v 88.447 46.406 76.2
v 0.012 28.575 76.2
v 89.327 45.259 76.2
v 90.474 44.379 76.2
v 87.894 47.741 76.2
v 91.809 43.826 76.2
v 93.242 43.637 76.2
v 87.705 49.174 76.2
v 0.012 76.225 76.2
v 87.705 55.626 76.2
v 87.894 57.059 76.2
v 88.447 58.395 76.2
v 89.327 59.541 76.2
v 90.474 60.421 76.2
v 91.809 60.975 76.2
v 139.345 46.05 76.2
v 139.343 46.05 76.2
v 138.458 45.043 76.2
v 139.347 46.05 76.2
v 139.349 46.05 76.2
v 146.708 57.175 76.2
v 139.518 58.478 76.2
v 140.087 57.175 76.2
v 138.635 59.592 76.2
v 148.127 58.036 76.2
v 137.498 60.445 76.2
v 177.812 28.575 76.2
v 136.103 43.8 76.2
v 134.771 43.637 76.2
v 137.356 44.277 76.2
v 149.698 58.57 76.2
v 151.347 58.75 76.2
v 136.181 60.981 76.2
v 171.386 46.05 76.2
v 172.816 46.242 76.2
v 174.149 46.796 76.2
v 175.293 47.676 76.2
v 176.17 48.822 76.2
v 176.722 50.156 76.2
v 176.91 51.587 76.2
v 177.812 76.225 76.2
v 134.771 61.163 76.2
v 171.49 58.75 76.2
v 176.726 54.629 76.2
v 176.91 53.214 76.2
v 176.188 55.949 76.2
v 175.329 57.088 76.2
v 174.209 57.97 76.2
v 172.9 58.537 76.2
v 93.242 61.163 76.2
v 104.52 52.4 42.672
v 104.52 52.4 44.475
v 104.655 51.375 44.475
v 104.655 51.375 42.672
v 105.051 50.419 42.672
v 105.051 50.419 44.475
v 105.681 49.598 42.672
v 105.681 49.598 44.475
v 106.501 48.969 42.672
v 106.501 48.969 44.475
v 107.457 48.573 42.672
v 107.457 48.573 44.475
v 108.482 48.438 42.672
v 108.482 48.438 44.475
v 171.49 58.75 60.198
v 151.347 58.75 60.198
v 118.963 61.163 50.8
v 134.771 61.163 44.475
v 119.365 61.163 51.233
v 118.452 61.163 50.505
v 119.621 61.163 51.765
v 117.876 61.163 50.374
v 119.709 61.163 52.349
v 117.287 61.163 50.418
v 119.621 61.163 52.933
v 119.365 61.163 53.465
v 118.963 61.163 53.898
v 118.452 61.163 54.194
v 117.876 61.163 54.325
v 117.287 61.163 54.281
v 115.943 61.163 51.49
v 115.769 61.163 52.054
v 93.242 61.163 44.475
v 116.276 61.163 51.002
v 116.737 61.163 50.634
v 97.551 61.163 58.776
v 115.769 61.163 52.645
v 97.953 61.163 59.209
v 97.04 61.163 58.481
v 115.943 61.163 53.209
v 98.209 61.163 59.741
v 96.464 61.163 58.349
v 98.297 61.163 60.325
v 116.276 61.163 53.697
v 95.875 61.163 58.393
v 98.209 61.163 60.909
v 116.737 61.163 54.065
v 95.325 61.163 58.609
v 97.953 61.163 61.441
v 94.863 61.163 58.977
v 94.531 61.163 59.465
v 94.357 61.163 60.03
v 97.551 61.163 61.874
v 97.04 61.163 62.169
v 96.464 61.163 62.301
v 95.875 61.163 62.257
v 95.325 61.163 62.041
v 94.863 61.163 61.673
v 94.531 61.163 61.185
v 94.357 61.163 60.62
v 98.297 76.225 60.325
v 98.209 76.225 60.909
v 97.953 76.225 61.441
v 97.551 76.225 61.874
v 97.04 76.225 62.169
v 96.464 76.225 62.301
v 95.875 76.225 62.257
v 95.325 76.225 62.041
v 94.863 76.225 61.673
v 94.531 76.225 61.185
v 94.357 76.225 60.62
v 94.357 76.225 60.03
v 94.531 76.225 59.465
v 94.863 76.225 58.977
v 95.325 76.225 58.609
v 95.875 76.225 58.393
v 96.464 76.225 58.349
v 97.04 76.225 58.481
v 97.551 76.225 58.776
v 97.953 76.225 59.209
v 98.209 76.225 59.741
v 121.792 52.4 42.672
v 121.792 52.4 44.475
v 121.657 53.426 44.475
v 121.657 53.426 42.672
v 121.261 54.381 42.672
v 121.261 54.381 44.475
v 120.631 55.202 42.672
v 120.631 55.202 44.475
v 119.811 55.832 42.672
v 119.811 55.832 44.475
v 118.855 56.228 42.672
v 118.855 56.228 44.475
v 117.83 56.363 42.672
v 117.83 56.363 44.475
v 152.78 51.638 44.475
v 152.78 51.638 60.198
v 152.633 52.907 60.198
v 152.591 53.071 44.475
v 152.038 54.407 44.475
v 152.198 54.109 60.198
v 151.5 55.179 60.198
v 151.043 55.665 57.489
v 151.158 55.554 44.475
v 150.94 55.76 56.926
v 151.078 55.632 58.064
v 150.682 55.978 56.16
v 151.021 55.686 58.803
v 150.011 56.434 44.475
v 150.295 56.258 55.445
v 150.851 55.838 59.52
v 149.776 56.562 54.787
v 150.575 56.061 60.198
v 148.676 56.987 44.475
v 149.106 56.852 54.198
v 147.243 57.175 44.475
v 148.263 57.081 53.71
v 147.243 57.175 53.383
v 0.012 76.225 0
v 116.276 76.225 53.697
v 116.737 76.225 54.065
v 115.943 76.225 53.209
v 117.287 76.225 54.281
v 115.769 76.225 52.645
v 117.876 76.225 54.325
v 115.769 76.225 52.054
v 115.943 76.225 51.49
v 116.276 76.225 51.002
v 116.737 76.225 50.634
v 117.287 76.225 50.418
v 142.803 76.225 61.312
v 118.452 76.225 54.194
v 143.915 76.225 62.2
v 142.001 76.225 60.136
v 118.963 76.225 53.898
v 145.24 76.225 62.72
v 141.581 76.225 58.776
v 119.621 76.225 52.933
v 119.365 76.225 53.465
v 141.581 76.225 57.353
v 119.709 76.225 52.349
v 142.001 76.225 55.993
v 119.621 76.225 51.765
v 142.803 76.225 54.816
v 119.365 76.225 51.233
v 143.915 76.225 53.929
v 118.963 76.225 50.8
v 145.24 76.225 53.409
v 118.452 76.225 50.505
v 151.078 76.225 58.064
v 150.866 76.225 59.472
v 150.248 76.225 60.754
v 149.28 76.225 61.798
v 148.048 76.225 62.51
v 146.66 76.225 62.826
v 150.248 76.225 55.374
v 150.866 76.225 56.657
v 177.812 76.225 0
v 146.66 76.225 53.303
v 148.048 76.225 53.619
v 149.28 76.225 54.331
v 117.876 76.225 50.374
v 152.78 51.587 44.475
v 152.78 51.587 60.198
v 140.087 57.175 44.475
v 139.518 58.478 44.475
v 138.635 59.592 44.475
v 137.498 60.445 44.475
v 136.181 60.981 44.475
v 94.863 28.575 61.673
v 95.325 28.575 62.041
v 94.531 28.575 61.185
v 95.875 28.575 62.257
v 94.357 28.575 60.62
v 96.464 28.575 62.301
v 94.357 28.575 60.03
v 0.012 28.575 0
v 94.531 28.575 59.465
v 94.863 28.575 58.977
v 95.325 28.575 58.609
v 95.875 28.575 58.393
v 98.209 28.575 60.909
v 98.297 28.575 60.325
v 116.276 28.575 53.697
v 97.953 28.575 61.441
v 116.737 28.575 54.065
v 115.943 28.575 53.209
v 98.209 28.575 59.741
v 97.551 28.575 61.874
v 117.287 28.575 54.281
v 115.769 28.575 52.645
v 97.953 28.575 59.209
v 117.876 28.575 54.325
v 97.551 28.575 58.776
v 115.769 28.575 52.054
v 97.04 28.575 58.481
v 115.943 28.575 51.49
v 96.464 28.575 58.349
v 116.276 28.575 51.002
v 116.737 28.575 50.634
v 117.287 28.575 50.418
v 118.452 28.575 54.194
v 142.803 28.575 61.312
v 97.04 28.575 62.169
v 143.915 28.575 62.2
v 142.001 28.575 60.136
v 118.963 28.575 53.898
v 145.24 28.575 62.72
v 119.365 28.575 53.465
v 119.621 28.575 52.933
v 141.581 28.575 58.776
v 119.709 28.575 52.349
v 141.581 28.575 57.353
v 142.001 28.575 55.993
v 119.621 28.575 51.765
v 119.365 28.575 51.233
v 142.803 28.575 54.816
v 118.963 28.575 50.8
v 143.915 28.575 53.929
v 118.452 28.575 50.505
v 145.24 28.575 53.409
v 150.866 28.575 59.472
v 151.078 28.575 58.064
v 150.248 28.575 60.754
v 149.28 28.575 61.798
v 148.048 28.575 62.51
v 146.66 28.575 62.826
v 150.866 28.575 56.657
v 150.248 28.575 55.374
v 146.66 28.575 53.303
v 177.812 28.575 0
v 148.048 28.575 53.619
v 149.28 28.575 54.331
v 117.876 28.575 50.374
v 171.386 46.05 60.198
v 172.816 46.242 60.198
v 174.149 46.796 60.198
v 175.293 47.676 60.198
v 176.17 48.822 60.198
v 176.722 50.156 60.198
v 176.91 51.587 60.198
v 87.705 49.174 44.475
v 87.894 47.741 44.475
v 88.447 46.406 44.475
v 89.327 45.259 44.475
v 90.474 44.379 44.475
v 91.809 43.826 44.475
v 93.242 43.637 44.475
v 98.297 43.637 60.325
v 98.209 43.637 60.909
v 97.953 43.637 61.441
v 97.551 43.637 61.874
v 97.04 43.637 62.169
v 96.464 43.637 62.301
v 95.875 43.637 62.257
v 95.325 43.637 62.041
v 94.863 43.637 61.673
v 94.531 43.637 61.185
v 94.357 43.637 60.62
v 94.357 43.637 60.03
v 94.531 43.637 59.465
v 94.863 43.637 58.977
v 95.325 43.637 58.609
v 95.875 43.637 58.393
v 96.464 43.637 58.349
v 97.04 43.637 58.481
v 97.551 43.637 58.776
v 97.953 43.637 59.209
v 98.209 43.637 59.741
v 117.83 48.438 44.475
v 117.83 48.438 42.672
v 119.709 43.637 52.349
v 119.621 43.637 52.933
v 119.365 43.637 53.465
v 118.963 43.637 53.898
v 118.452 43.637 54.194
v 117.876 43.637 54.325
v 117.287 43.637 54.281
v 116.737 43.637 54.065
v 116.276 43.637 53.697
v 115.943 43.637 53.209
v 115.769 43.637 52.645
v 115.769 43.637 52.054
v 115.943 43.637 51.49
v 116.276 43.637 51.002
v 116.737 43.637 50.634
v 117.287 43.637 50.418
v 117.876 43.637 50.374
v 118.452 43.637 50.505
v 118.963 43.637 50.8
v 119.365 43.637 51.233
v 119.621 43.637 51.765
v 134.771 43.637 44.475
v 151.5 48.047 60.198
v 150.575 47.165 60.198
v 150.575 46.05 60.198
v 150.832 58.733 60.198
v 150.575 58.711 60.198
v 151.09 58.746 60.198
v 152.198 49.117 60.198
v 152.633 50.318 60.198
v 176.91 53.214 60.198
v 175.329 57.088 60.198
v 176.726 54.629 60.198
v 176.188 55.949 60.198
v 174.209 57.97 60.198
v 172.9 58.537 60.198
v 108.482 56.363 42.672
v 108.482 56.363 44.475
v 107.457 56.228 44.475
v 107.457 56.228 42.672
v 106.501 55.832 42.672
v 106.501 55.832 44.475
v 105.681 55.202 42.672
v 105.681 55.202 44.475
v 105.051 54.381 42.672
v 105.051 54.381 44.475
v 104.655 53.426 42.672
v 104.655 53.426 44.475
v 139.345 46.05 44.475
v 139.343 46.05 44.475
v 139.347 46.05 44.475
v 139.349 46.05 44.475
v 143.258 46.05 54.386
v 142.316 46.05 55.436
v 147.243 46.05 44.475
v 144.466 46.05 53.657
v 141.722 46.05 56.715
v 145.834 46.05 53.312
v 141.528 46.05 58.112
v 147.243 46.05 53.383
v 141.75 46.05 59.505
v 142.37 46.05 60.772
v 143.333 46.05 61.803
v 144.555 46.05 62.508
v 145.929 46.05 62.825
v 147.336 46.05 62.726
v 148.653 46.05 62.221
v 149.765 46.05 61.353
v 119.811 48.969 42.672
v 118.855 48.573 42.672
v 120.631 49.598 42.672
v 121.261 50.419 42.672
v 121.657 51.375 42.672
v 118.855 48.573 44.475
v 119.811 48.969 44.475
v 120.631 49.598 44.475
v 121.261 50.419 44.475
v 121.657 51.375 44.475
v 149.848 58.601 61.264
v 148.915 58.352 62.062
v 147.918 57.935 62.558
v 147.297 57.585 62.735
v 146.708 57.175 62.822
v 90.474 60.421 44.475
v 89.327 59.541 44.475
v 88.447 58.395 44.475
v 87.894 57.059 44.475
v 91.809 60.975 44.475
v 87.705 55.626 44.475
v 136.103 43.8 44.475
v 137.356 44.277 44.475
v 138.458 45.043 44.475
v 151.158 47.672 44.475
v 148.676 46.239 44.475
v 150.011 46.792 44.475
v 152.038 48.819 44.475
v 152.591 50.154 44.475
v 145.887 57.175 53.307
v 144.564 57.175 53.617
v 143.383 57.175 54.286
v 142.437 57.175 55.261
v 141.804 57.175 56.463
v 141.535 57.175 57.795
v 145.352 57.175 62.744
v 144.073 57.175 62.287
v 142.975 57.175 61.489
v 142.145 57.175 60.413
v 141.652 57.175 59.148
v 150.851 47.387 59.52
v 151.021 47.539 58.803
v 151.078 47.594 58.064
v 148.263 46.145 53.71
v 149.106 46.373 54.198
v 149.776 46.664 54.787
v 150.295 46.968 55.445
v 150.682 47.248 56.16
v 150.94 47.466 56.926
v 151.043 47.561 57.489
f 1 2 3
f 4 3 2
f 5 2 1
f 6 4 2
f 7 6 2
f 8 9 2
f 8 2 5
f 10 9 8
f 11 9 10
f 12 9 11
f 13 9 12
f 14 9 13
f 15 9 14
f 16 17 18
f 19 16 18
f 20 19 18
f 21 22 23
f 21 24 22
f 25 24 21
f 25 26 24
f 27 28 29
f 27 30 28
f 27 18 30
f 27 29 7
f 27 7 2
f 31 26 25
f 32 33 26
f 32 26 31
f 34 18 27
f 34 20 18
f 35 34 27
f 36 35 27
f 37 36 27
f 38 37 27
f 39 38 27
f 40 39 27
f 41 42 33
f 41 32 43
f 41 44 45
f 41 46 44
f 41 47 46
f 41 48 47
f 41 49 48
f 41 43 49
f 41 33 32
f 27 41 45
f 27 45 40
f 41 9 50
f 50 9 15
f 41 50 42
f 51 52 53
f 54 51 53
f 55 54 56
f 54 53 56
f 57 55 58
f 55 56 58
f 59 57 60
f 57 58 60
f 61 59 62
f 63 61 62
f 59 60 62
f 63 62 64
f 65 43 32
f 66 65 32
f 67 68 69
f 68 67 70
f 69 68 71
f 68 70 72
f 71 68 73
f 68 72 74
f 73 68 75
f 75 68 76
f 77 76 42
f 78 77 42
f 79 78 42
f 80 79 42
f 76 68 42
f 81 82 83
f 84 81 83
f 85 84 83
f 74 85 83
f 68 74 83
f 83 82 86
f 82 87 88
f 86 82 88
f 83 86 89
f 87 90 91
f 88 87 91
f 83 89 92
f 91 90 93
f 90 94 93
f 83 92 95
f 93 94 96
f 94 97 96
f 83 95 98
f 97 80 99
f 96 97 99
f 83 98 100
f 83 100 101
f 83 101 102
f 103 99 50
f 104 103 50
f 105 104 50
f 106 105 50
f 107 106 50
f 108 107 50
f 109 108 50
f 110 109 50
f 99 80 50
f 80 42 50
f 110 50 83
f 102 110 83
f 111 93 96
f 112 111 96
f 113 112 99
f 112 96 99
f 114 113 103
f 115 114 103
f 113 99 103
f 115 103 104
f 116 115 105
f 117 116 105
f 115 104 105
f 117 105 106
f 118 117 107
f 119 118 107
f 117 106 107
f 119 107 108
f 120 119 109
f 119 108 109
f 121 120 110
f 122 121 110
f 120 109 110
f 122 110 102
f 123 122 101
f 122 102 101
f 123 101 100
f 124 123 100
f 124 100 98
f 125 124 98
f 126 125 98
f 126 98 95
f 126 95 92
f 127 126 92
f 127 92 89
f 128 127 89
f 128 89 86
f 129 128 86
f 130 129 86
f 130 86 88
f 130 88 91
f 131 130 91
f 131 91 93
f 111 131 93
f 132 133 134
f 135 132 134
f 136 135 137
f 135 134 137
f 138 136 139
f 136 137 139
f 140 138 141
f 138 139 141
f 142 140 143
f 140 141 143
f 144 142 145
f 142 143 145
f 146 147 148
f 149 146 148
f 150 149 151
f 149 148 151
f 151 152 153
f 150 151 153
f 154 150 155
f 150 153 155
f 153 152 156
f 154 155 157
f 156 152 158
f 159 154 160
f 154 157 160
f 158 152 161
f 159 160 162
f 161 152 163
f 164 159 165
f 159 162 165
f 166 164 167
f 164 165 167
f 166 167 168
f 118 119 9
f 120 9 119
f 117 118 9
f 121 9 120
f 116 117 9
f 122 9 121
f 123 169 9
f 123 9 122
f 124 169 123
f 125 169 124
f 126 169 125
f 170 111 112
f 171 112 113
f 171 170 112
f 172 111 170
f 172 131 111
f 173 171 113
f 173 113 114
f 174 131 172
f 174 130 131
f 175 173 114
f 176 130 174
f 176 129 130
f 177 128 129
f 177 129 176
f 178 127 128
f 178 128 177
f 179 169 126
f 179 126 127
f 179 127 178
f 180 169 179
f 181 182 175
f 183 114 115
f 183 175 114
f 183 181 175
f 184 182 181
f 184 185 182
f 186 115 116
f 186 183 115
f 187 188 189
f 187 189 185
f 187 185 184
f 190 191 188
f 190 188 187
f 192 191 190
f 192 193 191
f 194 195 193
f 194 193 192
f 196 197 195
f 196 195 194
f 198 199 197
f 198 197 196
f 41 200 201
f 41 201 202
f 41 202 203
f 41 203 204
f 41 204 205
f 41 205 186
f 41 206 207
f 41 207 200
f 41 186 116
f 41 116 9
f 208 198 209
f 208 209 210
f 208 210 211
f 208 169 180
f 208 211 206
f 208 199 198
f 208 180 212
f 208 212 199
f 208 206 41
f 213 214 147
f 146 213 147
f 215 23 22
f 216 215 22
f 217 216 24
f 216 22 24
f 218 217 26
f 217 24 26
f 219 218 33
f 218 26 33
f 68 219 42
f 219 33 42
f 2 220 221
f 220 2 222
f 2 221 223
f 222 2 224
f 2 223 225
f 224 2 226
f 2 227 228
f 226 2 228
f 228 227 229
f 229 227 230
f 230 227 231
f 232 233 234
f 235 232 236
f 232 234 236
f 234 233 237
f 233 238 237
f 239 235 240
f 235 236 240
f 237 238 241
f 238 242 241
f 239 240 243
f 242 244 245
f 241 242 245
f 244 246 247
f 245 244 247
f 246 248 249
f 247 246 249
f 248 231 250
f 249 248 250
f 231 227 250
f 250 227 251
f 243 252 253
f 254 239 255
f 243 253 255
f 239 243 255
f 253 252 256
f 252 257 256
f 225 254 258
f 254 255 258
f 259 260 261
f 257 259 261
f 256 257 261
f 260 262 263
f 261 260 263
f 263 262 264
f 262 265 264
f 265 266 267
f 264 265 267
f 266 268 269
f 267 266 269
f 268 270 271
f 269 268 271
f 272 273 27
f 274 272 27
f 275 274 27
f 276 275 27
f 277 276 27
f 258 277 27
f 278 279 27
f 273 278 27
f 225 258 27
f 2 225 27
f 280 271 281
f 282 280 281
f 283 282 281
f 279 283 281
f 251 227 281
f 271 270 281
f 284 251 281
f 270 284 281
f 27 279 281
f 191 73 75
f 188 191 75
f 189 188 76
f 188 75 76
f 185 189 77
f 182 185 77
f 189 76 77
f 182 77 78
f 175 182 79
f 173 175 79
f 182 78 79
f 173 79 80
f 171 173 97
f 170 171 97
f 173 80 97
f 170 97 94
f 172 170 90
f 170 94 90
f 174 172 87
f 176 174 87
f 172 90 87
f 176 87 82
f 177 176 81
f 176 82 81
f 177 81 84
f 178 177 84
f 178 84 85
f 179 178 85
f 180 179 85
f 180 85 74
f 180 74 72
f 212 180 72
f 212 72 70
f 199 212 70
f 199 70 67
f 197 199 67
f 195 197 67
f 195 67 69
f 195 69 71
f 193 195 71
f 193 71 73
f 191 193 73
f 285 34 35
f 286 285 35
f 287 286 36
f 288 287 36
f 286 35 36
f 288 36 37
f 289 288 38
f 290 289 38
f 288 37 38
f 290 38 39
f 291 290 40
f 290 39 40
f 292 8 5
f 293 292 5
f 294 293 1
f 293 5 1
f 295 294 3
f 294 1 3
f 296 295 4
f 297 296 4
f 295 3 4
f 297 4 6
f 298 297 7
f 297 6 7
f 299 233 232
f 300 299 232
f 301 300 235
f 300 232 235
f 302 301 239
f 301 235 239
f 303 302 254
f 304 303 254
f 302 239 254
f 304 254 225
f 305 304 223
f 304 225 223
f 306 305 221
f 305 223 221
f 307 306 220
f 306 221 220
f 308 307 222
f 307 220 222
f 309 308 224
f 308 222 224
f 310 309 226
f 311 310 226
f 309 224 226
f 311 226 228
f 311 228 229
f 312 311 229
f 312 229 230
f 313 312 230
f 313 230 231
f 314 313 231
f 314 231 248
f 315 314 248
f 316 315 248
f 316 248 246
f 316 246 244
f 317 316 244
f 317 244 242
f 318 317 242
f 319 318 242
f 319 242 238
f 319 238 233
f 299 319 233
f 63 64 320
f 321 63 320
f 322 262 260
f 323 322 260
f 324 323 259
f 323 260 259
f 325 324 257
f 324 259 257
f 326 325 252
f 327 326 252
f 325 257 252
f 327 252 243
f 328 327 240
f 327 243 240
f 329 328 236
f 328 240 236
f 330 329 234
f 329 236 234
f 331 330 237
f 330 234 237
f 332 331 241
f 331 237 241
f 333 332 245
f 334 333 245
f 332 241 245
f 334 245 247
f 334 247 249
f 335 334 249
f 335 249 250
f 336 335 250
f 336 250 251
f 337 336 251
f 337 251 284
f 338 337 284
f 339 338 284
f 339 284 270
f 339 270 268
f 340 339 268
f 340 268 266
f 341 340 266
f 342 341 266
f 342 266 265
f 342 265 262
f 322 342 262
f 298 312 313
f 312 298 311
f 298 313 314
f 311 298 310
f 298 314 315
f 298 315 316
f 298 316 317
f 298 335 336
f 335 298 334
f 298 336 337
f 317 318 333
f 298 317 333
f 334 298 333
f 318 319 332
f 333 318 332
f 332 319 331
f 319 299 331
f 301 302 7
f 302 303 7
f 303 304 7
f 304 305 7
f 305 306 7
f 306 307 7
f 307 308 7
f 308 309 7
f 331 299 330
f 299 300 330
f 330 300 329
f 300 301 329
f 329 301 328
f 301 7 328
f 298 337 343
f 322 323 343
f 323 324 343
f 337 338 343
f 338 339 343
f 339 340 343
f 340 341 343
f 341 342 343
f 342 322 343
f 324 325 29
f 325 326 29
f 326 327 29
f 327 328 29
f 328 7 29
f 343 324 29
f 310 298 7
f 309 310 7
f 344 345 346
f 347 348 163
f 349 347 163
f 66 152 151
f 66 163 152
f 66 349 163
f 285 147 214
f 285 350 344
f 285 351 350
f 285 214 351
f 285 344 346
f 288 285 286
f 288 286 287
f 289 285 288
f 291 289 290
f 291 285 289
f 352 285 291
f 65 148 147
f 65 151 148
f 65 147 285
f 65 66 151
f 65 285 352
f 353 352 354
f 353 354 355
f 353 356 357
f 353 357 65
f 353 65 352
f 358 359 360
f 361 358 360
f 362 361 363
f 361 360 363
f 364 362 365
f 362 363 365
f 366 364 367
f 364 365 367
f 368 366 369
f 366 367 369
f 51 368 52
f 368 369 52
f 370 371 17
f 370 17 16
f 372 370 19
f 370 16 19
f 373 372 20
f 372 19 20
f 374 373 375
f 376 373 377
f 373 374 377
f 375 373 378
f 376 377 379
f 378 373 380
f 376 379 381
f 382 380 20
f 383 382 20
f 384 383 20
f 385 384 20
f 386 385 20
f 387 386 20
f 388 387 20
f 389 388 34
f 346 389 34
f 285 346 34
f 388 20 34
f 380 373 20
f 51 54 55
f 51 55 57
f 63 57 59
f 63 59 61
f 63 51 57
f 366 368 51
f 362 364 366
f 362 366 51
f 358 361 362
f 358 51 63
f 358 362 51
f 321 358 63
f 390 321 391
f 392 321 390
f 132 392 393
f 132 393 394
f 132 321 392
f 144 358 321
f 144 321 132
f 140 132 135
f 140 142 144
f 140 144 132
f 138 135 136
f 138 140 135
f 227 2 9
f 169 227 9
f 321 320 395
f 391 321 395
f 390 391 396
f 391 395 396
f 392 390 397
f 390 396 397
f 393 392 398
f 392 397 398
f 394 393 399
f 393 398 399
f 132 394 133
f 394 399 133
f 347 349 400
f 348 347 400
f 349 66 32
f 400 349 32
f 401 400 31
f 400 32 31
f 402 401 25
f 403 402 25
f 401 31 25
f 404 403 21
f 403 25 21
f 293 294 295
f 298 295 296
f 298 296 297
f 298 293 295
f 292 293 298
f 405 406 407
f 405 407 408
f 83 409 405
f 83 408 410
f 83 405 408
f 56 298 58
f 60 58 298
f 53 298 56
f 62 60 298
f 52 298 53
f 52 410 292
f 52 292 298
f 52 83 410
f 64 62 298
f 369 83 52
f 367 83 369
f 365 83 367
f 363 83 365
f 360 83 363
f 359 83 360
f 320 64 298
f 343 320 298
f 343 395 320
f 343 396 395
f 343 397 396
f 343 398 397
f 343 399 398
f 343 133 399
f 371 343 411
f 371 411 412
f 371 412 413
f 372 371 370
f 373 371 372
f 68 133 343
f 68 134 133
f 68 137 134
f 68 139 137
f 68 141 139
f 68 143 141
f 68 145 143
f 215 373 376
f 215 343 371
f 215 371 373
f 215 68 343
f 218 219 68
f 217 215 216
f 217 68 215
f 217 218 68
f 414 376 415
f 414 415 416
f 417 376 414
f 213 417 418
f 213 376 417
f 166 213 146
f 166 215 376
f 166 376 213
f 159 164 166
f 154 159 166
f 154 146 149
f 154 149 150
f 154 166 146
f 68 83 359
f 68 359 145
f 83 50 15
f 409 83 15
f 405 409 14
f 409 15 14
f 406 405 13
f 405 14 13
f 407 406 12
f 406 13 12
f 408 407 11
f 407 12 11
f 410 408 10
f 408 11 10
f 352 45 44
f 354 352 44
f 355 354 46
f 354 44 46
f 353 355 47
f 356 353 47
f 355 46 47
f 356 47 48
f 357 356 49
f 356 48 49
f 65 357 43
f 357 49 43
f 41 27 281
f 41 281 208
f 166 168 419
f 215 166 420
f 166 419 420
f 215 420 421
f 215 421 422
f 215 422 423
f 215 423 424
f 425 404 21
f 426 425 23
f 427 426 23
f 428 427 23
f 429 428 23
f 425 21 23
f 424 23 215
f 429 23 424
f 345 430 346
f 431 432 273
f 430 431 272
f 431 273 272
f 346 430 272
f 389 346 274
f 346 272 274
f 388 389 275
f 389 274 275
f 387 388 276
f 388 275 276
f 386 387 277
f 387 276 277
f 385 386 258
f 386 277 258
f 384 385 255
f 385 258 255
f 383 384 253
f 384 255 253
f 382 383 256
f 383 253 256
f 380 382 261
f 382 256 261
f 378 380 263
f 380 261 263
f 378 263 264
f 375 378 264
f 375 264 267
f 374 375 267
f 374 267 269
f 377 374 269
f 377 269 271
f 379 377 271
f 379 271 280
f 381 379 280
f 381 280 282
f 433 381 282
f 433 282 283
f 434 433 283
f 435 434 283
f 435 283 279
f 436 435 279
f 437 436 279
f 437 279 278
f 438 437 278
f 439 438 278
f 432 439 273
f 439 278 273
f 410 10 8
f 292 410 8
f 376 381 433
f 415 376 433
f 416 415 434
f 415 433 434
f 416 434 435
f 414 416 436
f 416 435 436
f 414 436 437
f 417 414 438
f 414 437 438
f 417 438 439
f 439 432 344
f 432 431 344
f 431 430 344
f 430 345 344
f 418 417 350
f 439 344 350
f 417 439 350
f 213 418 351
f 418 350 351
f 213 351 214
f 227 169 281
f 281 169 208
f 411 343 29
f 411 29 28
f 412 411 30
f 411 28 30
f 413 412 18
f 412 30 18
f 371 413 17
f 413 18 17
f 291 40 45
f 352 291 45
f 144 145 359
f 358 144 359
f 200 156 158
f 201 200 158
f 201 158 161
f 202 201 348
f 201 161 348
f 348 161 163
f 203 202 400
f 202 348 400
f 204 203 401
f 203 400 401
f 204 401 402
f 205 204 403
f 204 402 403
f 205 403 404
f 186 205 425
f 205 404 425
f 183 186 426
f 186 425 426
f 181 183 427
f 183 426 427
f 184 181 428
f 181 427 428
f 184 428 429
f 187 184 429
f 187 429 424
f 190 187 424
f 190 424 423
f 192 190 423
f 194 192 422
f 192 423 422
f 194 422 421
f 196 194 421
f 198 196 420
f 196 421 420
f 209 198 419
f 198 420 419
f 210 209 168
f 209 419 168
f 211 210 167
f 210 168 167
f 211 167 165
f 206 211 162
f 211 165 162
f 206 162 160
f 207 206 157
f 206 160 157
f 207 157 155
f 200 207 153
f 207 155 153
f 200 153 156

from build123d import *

# Parameters (mm, degrees)
F0_W      = 177.8
F0_H      = 47.6504
F1_DEPTH  = 76.2
F2_R      = 4.7752
F2_R_2    = 1.9812
F3_DEPTH  = 47.6514
F5_DEPTH  = 16.002
F7_DEPTH  = 33.528
F9_DEPTH  = 31.7246
F11_DEPTH = 31.7246


with BuildPart() as f1:
    # F0 (on Top) → F1 (new body)
    with BuildSketch(Plane.XY):
        with Locations((88.911714, 52.4002)):
            Rectangle(F0_W, F0_H)
    extrude(amount=F1_DEPTH)

    # F2 (on face) → F3 (cut, through all)
    with BuildSketch(Plane.XZ.offset(-28.575)):
        with Locations((146.303014, 58.0644)):
            Circle(F2_R)
        with Locations((117.728014, 52.3494)):
            Circle(F2_R_2)
        with Locations((96.315814, 60.325)):
            Circle(F2_R_2)
    extrude(amount=-F3_DEPTH, mode=Mode.SUBTRACT)

    # F4 (on face) → F5 (cut)
    with BuildSketch(Plane.XY.offset(76.2)):
        with BuildLine():
            Line((176.910014, 51.587385), (176.910014, 53.214231))
            ThreePointArc((176.910014, 53.214231), (175.329273, 57.08812), (171.489579, 58.7502))
            Line((171.489579, 58.7502), (151.347379, 58.7502))
            ThreePointArc((151.347379, 58.7502), (145.959225, 56.518354), (143.727379, 51.1302))
            Line((143.727379, 51.1302), (143.727379, 49.2252))
            ThreePointArc((143.727379, 49.2252), (144.657315, 46.980136), (146.902379, 46.0502))
            Line((146.902379, 46.0502), (171.385514, 46.0502))
            ThreePointArc((171.385514, 46.0502), (175.292693, 47.676486), (176.910014, 51.587385))
        make_face()
    extrude(amount=-F5_DEPTH, mode=Mode.SUBTRACT)

    # F6 (on face) → F7 (cut)
    with BuildSketch(Plane.XY.offset(76.2)):
        with BuildLine():
            Line((117.829614, 56.3626), (108.482414, 56.3626))
            ThreePointArc((108.482414, 56.3626), (105.680574, 55.20204), (104.520014, 52.4002))
            ThreePointArc((104.520014, 52.4002), (105.680574, 49.59836), (108.482414, 48.4378))
            Line((108.482414, 48.4378), (117.829614, 48.4378))
            ThreePointArc((117.829614, 48.4378), (120.631454, 49.59836), (121.792014, 52.4002))
            ThreePointArc((121.792014, 52.4002), (120.631454, 55.20204), (117.829614, 56.3626))
        make_face()
    extrude(amount=-F7_DEPTH, mode=Mode.SUBTRACT)

    # F8 (on face) → F9 (cut)
    with BuildSketch(Plane.XY.offset(76.2)):
        with BuildLine():
            Line((134.771414, 61.1632), (93.242414, 61.1632))
            ThreePointArc((93.242414, 61.1632), (89.327022, 59.541392), (87.705214, 55.626))
            Line((87.705214, 55.626), (87.705214, 49.1744))
            ThreePointArc((87.705214, 49.1744), (89.327022, 45.259008), (93.242414, 43.6372))
            Line((93.242414, 43.6372), (134.771414, 43.6372))
            ThreePointArc((134.771414, 43.6372), (138.686805, 45.259008), (140.308614, 49.1744))
            Line((140.308614, 49.1744), (140.308614, 55.626))
            ThreePointArc((140.308614, 55.626), (138.686805, 59.541392), (134.771414, 61.1632))
        make_face()
    extrude(amount=-F9_DEPTH, mode=Mode.SUBTRACT)

    # F10 (on face) → F11 (cut)
    with BuildSketch(Plane.XY.offset(76.2)):
        with BuildLine():
            Line((147.242814, 57.1754), (139.34862, 57.1754))
            ThreePointArc((139.34862, 57.1754), (137.103556, 56.245464), (136.17362, 54.0004))
            Line((136.17362, 54.0004), (136.17362, 49.2252))
            ThreePointArc((136.17362, 49.2252), (137.103556, 46.980136), (139.34862, 46.0502))
            Line((139.34862, 46.0502), (147.242814, 46.0502))
            ThreePointArc((147.242814, 46.0502), (151.158205, 47.672008), (152.780014, 51.5874))
            Line((152.780014, 51.5874), (152.780014, 51.6382))
            ThreePointArc((152.780014, 51.6382), (151.158205, 55.553592), (147.242814, 57.1754))
        make_face()
    extrude(amount=-F11_DEPTH, mode=Mode.SUBTRACT)


solid = f1.part
